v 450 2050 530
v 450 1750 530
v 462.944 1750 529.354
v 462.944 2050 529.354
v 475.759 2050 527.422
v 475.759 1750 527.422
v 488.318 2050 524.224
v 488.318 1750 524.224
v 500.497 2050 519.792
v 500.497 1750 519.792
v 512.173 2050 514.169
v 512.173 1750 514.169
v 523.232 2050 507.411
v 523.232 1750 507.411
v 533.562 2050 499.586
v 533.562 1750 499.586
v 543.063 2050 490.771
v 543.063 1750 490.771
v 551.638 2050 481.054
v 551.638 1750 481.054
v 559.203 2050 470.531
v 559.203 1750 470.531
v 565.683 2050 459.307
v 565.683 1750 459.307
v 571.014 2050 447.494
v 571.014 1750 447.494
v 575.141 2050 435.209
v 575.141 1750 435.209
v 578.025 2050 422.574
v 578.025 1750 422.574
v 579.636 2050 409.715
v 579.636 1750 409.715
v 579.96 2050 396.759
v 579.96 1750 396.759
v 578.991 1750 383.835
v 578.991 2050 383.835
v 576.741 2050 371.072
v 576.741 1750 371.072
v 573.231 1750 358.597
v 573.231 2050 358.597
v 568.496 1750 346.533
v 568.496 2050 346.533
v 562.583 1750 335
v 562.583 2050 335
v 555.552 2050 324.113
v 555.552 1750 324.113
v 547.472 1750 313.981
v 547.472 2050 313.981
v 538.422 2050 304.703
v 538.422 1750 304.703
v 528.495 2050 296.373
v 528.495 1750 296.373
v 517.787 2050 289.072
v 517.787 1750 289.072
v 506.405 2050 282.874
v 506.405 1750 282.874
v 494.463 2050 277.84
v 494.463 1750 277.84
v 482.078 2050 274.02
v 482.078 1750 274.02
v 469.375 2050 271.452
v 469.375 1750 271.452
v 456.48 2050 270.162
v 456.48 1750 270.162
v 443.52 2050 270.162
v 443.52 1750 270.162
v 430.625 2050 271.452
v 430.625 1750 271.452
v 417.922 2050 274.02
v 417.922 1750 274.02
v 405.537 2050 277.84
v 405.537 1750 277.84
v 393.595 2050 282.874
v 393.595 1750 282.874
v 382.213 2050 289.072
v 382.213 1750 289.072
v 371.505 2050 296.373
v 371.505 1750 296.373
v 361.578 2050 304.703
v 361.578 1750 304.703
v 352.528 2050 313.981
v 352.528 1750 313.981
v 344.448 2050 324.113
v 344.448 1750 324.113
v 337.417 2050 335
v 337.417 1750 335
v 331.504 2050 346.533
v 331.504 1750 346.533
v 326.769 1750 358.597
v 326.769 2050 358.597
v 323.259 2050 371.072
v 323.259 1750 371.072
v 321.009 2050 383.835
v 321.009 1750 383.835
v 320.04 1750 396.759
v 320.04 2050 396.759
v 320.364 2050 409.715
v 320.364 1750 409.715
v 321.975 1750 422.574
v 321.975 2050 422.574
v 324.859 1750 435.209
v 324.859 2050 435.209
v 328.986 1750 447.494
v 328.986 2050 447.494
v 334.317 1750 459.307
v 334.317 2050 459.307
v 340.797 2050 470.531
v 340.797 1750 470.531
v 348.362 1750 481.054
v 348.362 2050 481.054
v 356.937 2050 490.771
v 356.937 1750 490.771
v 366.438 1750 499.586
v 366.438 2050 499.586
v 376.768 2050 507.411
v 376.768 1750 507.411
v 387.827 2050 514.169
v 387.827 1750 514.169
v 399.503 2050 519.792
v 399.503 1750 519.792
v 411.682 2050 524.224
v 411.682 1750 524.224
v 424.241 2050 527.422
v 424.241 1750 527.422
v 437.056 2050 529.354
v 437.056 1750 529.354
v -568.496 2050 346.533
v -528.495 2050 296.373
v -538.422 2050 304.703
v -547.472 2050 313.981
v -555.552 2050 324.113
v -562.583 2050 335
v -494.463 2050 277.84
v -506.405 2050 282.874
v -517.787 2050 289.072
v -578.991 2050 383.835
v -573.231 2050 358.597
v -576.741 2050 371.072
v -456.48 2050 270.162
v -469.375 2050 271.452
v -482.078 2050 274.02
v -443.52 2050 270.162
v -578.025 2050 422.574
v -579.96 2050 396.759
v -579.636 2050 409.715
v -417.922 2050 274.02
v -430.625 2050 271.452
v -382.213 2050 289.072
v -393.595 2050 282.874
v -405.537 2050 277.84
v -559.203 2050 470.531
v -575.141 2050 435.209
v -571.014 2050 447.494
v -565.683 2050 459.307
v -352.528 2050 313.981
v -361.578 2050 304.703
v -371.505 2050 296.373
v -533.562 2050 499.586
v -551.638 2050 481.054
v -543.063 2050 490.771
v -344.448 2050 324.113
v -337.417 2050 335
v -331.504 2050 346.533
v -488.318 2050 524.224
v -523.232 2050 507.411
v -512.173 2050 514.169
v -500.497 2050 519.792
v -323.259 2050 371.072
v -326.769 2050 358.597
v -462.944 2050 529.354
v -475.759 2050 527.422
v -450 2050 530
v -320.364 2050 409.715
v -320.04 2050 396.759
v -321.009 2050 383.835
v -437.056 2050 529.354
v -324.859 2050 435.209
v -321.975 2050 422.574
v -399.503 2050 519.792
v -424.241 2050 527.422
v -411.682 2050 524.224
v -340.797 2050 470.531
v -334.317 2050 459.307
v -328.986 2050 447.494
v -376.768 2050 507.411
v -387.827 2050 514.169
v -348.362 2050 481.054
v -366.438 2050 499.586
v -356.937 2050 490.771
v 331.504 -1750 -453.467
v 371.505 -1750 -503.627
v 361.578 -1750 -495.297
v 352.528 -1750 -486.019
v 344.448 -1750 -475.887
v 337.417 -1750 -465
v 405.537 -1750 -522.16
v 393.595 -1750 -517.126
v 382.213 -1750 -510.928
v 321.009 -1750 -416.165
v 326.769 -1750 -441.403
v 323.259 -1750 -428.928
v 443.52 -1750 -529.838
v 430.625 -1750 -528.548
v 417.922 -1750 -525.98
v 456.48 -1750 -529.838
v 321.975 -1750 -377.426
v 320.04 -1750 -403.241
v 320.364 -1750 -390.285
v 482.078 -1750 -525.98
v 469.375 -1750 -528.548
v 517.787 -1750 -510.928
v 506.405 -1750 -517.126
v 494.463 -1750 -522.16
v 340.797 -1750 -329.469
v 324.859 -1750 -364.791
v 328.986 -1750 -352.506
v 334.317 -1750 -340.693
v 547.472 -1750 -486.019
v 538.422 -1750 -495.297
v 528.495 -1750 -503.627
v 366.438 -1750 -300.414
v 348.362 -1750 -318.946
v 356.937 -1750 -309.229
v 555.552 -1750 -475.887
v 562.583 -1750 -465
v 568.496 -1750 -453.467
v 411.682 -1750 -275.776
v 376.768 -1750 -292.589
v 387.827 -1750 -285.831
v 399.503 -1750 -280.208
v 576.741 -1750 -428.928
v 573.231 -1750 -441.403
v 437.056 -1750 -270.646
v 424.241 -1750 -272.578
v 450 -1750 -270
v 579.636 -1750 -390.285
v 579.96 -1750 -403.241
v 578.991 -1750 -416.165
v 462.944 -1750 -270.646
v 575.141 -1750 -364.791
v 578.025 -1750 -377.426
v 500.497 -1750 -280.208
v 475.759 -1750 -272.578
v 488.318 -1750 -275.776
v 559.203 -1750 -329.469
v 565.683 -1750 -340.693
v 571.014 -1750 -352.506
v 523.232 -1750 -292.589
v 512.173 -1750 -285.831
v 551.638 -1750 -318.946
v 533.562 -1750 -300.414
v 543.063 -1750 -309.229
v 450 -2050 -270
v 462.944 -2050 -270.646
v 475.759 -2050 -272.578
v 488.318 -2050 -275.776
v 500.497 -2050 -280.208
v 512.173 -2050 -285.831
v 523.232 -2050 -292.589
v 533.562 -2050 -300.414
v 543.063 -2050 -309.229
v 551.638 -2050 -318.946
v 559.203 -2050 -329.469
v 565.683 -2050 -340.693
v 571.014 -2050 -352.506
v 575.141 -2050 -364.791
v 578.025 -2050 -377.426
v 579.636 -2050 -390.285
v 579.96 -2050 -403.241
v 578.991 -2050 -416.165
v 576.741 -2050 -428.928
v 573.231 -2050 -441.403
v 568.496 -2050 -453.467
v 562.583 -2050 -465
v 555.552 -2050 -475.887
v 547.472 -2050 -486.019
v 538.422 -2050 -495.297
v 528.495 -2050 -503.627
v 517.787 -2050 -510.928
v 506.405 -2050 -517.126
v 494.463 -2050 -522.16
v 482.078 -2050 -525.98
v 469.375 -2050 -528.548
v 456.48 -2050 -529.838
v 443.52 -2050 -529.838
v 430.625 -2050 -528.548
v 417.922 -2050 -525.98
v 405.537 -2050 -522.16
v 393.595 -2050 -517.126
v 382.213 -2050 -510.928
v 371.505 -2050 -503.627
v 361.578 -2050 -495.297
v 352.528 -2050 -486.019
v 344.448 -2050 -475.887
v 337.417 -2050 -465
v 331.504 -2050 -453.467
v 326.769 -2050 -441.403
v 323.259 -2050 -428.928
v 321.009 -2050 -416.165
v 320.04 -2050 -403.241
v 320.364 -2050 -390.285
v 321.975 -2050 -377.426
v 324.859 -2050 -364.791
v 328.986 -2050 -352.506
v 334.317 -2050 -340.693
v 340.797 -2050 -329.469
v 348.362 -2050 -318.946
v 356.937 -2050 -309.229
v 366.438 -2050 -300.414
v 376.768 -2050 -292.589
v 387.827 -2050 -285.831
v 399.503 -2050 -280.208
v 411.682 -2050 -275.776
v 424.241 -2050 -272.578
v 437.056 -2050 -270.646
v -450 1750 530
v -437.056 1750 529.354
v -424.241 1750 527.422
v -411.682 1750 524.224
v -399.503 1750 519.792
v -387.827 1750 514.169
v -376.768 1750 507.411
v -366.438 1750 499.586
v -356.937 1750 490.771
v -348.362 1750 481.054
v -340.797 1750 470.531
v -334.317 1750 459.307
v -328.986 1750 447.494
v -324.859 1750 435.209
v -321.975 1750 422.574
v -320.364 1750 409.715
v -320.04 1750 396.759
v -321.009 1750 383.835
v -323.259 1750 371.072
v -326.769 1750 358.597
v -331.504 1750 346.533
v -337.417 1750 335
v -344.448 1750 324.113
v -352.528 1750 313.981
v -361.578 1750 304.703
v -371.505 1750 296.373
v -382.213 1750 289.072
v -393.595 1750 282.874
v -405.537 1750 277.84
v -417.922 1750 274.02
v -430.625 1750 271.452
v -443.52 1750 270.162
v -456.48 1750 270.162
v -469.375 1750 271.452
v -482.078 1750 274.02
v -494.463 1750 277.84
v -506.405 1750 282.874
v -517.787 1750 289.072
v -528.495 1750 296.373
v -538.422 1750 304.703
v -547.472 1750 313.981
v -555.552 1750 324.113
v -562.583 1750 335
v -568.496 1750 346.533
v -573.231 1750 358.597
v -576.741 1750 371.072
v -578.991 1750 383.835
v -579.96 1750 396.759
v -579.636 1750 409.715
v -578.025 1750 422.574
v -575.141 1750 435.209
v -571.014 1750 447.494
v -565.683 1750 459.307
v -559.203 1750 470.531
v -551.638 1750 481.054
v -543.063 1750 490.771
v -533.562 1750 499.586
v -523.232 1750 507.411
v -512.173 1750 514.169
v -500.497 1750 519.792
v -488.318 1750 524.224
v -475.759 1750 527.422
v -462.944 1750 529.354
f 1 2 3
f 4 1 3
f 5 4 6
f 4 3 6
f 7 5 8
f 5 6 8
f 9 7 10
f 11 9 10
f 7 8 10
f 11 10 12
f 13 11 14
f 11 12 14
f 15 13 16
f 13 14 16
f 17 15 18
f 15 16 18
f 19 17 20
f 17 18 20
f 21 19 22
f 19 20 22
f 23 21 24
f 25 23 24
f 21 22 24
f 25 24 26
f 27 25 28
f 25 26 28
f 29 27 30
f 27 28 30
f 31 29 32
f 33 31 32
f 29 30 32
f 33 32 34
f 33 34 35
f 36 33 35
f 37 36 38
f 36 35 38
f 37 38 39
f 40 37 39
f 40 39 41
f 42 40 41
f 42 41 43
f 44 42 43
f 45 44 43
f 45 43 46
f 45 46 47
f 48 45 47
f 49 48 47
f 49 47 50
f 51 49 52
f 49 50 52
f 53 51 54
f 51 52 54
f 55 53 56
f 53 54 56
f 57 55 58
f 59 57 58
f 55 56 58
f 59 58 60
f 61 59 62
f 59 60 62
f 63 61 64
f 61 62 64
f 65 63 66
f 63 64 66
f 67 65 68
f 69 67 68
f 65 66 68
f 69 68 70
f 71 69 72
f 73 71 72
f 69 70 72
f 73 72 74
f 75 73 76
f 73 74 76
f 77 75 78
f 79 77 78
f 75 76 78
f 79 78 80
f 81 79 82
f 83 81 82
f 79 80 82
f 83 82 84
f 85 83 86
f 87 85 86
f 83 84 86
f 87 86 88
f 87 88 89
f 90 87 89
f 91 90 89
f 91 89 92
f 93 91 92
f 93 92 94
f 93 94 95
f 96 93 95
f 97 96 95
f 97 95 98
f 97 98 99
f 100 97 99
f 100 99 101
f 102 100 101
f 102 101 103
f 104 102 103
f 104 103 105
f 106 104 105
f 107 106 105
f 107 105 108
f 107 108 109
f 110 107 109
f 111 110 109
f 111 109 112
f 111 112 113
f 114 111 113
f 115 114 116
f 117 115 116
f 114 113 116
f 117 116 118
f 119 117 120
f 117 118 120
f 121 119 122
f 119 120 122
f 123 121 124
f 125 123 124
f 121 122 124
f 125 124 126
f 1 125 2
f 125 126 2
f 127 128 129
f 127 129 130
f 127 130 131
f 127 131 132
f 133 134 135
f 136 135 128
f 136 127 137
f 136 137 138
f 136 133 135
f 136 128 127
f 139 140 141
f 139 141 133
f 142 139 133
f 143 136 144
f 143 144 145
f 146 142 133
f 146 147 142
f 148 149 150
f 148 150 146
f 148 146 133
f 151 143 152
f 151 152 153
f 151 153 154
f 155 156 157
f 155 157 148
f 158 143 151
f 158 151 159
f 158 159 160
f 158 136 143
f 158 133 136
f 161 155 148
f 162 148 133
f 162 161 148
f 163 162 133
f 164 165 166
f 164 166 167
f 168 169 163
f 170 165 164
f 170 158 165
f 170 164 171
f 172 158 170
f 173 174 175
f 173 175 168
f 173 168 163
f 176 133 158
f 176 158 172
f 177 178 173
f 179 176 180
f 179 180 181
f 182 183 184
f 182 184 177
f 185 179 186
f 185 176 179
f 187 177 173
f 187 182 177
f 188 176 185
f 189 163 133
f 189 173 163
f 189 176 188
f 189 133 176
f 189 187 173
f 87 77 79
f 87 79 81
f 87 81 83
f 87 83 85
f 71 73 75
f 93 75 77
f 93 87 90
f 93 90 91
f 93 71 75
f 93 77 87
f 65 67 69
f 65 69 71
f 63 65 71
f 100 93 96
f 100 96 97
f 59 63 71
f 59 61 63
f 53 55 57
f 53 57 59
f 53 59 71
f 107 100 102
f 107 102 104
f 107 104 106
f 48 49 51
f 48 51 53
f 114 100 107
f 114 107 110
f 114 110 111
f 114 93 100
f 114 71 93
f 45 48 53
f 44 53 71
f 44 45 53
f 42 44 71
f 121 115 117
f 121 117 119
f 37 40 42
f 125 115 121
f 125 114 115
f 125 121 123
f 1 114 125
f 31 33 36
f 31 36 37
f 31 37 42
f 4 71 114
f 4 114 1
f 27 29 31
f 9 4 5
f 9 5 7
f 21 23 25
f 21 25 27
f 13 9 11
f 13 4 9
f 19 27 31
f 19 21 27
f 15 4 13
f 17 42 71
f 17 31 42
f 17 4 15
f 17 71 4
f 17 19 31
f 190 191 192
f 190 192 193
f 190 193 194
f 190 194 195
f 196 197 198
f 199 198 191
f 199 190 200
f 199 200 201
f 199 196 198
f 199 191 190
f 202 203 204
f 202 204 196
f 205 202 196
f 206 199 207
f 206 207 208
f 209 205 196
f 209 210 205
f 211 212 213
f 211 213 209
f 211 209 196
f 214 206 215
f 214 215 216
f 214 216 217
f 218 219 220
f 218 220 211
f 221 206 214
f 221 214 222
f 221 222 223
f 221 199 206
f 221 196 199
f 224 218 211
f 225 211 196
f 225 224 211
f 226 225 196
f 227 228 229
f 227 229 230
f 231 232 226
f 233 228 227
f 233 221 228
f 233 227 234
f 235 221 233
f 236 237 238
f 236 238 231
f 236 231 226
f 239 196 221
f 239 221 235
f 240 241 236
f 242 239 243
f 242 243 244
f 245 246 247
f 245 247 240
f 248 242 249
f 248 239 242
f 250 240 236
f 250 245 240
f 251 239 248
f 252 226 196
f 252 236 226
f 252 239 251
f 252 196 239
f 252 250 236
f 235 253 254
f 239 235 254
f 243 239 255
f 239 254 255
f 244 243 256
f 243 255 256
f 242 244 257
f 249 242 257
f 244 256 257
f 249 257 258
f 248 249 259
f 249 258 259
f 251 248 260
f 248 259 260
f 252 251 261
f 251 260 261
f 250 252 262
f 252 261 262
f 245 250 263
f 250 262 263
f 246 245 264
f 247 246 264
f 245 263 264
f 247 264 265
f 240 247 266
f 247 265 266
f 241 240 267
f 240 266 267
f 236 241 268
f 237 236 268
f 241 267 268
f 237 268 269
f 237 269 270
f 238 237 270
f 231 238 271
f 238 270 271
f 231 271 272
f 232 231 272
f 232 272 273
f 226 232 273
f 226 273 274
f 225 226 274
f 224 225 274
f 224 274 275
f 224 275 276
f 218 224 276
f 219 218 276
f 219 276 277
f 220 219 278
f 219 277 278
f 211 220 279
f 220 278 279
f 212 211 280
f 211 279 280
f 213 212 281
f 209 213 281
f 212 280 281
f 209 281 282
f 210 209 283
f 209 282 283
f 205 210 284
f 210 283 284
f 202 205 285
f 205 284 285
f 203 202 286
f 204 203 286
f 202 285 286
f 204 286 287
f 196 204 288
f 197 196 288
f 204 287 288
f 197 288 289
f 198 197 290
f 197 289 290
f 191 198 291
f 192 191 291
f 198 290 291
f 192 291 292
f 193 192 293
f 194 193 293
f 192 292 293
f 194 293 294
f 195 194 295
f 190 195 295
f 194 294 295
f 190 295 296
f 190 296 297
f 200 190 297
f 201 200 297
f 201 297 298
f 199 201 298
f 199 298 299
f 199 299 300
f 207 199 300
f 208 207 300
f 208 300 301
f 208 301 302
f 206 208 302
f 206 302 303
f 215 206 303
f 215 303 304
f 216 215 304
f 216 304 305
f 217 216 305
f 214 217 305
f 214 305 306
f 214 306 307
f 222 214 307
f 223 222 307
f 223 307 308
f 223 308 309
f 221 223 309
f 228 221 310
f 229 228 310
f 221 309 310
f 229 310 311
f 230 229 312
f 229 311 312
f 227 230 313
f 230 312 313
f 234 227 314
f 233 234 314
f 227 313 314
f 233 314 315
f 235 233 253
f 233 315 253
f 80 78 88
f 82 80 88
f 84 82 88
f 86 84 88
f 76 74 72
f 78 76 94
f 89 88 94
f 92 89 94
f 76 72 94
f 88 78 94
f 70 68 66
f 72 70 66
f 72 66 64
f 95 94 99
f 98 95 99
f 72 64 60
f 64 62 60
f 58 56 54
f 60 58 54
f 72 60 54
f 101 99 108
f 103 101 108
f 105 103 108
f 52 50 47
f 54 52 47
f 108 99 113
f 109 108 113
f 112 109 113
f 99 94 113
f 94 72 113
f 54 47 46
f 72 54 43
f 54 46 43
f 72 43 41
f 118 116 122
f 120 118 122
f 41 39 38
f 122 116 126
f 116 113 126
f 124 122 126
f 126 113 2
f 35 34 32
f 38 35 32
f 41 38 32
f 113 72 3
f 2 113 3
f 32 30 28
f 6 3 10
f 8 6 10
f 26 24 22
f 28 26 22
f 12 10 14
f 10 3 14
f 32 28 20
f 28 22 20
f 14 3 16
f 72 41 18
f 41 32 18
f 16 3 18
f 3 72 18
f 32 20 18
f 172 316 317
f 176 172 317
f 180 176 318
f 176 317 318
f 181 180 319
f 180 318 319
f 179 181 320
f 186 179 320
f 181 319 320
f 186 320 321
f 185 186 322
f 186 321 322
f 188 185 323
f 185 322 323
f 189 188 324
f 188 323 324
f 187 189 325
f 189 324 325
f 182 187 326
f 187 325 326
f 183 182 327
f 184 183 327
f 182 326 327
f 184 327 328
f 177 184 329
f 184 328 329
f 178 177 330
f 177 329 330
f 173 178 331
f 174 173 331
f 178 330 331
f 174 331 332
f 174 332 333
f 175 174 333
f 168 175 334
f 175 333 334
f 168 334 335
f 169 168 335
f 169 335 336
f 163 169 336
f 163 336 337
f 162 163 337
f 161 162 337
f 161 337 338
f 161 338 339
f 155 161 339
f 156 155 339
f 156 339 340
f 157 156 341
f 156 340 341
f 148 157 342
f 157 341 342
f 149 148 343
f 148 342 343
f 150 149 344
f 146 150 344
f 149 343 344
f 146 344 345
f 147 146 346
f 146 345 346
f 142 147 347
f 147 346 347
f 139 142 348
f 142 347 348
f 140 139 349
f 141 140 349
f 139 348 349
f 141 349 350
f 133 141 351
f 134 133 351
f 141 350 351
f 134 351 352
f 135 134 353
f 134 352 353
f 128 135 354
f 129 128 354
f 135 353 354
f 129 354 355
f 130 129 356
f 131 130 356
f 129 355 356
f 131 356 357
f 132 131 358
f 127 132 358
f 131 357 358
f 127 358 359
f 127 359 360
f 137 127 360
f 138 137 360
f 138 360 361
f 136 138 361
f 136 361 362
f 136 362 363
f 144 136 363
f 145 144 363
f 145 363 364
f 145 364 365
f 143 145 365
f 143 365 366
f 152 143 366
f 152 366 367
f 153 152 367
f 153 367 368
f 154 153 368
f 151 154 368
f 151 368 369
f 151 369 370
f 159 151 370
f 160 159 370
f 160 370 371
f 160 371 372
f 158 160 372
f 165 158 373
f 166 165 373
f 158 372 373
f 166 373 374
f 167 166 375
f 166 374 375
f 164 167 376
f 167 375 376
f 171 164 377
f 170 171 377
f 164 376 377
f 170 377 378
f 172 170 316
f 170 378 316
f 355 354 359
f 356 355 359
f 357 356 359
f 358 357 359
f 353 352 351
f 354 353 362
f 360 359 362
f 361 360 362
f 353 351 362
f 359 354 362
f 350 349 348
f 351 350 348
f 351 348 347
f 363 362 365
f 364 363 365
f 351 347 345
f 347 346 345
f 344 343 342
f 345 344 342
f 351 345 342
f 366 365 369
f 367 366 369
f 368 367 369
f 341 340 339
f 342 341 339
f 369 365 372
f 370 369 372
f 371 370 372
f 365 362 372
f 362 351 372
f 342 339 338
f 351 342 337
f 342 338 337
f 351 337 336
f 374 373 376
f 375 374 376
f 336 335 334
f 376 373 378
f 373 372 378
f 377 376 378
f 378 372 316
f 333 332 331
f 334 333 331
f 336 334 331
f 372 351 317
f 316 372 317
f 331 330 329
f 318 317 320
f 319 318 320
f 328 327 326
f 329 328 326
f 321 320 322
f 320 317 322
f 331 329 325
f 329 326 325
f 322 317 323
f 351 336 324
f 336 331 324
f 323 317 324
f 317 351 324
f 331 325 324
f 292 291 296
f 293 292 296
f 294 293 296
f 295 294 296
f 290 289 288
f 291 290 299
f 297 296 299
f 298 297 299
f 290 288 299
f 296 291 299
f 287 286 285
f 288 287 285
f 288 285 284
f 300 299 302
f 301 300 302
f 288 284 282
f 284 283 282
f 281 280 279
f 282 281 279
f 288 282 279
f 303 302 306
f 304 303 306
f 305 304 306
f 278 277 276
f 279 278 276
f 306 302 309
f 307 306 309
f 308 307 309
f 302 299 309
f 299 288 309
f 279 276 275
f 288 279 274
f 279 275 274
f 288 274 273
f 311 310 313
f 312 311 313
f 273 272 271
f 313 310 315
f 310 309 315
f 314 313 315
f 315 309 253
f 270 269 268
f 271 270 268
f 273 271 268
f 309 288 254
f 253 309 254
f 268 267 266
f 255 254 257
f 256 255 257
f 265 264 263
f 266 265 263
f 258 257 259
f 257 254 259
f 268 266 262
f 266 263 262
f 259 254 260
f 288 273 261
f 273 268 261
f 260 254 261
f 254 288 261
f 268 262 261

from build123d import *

# Parameters (mm, degrees)
BOSS_EXTRUDE1_START = 1750
SKETCH1_R           = 130
BOSS_EXTRUDE1_DEPTH = 300
BOSS_EXTRUDE2_START = 1750
SKETCH2_R           = 130
BOSS_EXTRUDE2_DEPTH = 300
BOSS_EXTRUDE3_START = -2050
SKETCH3_R           = 130
BOSS_EXTRUDE3_DEPTH = 300


with BuildPart() as part:
    # Sketch1 → Boss-Extrude1 (new body)
    with BuildSketch(Plane(origin=(0, 0, 0), x_dir=(1, 0, 0), z_dir=(0, 1, 0)).offset(BOSS_EXTRUDE1_START)):
        with Locations(Location((450, -400, 0), (0, 0, 270))):
            Circle(SKETCH1_R)
    extrude(amount=BOSS_EXTRUDE1_DEPTH)


with BuildPart() as body_2:
    # Sketch2 → Boss-Extrude2 (new body)
    with BuildSketch(Plane(origin=(0, 0, 0), x_dir=(1, 0, 0), z_dir=(0, 1, 0)).offset(BOSS_EXTRUDE2_START)):
        with Locations(Location((-450, -400, 0), (0, 0, 270))):
            Circle(SKETCH2_R)
    extrude(amount=BOSS_EXTRUDE2_DEPTH)


with BuildPart() as body_3:
    # Sketch3 → Boss-Extrude3 (new body)
    with BuildSketch(Plane(origin=(0, 0, 0), x_dir=(1, 0, 0), z_dir=(0, 1, 0)).offset(BOSS_EXTRUDE3_START)):
        with Locations(Location((450, 400, 0), (0, 0, 270))):
            Circle(SKETCH3_R)
    extrude(amount=BOSS_EXTRUDE3_DEPTH)


solid = Compound([part.part, body_2.part, body_3.part])
